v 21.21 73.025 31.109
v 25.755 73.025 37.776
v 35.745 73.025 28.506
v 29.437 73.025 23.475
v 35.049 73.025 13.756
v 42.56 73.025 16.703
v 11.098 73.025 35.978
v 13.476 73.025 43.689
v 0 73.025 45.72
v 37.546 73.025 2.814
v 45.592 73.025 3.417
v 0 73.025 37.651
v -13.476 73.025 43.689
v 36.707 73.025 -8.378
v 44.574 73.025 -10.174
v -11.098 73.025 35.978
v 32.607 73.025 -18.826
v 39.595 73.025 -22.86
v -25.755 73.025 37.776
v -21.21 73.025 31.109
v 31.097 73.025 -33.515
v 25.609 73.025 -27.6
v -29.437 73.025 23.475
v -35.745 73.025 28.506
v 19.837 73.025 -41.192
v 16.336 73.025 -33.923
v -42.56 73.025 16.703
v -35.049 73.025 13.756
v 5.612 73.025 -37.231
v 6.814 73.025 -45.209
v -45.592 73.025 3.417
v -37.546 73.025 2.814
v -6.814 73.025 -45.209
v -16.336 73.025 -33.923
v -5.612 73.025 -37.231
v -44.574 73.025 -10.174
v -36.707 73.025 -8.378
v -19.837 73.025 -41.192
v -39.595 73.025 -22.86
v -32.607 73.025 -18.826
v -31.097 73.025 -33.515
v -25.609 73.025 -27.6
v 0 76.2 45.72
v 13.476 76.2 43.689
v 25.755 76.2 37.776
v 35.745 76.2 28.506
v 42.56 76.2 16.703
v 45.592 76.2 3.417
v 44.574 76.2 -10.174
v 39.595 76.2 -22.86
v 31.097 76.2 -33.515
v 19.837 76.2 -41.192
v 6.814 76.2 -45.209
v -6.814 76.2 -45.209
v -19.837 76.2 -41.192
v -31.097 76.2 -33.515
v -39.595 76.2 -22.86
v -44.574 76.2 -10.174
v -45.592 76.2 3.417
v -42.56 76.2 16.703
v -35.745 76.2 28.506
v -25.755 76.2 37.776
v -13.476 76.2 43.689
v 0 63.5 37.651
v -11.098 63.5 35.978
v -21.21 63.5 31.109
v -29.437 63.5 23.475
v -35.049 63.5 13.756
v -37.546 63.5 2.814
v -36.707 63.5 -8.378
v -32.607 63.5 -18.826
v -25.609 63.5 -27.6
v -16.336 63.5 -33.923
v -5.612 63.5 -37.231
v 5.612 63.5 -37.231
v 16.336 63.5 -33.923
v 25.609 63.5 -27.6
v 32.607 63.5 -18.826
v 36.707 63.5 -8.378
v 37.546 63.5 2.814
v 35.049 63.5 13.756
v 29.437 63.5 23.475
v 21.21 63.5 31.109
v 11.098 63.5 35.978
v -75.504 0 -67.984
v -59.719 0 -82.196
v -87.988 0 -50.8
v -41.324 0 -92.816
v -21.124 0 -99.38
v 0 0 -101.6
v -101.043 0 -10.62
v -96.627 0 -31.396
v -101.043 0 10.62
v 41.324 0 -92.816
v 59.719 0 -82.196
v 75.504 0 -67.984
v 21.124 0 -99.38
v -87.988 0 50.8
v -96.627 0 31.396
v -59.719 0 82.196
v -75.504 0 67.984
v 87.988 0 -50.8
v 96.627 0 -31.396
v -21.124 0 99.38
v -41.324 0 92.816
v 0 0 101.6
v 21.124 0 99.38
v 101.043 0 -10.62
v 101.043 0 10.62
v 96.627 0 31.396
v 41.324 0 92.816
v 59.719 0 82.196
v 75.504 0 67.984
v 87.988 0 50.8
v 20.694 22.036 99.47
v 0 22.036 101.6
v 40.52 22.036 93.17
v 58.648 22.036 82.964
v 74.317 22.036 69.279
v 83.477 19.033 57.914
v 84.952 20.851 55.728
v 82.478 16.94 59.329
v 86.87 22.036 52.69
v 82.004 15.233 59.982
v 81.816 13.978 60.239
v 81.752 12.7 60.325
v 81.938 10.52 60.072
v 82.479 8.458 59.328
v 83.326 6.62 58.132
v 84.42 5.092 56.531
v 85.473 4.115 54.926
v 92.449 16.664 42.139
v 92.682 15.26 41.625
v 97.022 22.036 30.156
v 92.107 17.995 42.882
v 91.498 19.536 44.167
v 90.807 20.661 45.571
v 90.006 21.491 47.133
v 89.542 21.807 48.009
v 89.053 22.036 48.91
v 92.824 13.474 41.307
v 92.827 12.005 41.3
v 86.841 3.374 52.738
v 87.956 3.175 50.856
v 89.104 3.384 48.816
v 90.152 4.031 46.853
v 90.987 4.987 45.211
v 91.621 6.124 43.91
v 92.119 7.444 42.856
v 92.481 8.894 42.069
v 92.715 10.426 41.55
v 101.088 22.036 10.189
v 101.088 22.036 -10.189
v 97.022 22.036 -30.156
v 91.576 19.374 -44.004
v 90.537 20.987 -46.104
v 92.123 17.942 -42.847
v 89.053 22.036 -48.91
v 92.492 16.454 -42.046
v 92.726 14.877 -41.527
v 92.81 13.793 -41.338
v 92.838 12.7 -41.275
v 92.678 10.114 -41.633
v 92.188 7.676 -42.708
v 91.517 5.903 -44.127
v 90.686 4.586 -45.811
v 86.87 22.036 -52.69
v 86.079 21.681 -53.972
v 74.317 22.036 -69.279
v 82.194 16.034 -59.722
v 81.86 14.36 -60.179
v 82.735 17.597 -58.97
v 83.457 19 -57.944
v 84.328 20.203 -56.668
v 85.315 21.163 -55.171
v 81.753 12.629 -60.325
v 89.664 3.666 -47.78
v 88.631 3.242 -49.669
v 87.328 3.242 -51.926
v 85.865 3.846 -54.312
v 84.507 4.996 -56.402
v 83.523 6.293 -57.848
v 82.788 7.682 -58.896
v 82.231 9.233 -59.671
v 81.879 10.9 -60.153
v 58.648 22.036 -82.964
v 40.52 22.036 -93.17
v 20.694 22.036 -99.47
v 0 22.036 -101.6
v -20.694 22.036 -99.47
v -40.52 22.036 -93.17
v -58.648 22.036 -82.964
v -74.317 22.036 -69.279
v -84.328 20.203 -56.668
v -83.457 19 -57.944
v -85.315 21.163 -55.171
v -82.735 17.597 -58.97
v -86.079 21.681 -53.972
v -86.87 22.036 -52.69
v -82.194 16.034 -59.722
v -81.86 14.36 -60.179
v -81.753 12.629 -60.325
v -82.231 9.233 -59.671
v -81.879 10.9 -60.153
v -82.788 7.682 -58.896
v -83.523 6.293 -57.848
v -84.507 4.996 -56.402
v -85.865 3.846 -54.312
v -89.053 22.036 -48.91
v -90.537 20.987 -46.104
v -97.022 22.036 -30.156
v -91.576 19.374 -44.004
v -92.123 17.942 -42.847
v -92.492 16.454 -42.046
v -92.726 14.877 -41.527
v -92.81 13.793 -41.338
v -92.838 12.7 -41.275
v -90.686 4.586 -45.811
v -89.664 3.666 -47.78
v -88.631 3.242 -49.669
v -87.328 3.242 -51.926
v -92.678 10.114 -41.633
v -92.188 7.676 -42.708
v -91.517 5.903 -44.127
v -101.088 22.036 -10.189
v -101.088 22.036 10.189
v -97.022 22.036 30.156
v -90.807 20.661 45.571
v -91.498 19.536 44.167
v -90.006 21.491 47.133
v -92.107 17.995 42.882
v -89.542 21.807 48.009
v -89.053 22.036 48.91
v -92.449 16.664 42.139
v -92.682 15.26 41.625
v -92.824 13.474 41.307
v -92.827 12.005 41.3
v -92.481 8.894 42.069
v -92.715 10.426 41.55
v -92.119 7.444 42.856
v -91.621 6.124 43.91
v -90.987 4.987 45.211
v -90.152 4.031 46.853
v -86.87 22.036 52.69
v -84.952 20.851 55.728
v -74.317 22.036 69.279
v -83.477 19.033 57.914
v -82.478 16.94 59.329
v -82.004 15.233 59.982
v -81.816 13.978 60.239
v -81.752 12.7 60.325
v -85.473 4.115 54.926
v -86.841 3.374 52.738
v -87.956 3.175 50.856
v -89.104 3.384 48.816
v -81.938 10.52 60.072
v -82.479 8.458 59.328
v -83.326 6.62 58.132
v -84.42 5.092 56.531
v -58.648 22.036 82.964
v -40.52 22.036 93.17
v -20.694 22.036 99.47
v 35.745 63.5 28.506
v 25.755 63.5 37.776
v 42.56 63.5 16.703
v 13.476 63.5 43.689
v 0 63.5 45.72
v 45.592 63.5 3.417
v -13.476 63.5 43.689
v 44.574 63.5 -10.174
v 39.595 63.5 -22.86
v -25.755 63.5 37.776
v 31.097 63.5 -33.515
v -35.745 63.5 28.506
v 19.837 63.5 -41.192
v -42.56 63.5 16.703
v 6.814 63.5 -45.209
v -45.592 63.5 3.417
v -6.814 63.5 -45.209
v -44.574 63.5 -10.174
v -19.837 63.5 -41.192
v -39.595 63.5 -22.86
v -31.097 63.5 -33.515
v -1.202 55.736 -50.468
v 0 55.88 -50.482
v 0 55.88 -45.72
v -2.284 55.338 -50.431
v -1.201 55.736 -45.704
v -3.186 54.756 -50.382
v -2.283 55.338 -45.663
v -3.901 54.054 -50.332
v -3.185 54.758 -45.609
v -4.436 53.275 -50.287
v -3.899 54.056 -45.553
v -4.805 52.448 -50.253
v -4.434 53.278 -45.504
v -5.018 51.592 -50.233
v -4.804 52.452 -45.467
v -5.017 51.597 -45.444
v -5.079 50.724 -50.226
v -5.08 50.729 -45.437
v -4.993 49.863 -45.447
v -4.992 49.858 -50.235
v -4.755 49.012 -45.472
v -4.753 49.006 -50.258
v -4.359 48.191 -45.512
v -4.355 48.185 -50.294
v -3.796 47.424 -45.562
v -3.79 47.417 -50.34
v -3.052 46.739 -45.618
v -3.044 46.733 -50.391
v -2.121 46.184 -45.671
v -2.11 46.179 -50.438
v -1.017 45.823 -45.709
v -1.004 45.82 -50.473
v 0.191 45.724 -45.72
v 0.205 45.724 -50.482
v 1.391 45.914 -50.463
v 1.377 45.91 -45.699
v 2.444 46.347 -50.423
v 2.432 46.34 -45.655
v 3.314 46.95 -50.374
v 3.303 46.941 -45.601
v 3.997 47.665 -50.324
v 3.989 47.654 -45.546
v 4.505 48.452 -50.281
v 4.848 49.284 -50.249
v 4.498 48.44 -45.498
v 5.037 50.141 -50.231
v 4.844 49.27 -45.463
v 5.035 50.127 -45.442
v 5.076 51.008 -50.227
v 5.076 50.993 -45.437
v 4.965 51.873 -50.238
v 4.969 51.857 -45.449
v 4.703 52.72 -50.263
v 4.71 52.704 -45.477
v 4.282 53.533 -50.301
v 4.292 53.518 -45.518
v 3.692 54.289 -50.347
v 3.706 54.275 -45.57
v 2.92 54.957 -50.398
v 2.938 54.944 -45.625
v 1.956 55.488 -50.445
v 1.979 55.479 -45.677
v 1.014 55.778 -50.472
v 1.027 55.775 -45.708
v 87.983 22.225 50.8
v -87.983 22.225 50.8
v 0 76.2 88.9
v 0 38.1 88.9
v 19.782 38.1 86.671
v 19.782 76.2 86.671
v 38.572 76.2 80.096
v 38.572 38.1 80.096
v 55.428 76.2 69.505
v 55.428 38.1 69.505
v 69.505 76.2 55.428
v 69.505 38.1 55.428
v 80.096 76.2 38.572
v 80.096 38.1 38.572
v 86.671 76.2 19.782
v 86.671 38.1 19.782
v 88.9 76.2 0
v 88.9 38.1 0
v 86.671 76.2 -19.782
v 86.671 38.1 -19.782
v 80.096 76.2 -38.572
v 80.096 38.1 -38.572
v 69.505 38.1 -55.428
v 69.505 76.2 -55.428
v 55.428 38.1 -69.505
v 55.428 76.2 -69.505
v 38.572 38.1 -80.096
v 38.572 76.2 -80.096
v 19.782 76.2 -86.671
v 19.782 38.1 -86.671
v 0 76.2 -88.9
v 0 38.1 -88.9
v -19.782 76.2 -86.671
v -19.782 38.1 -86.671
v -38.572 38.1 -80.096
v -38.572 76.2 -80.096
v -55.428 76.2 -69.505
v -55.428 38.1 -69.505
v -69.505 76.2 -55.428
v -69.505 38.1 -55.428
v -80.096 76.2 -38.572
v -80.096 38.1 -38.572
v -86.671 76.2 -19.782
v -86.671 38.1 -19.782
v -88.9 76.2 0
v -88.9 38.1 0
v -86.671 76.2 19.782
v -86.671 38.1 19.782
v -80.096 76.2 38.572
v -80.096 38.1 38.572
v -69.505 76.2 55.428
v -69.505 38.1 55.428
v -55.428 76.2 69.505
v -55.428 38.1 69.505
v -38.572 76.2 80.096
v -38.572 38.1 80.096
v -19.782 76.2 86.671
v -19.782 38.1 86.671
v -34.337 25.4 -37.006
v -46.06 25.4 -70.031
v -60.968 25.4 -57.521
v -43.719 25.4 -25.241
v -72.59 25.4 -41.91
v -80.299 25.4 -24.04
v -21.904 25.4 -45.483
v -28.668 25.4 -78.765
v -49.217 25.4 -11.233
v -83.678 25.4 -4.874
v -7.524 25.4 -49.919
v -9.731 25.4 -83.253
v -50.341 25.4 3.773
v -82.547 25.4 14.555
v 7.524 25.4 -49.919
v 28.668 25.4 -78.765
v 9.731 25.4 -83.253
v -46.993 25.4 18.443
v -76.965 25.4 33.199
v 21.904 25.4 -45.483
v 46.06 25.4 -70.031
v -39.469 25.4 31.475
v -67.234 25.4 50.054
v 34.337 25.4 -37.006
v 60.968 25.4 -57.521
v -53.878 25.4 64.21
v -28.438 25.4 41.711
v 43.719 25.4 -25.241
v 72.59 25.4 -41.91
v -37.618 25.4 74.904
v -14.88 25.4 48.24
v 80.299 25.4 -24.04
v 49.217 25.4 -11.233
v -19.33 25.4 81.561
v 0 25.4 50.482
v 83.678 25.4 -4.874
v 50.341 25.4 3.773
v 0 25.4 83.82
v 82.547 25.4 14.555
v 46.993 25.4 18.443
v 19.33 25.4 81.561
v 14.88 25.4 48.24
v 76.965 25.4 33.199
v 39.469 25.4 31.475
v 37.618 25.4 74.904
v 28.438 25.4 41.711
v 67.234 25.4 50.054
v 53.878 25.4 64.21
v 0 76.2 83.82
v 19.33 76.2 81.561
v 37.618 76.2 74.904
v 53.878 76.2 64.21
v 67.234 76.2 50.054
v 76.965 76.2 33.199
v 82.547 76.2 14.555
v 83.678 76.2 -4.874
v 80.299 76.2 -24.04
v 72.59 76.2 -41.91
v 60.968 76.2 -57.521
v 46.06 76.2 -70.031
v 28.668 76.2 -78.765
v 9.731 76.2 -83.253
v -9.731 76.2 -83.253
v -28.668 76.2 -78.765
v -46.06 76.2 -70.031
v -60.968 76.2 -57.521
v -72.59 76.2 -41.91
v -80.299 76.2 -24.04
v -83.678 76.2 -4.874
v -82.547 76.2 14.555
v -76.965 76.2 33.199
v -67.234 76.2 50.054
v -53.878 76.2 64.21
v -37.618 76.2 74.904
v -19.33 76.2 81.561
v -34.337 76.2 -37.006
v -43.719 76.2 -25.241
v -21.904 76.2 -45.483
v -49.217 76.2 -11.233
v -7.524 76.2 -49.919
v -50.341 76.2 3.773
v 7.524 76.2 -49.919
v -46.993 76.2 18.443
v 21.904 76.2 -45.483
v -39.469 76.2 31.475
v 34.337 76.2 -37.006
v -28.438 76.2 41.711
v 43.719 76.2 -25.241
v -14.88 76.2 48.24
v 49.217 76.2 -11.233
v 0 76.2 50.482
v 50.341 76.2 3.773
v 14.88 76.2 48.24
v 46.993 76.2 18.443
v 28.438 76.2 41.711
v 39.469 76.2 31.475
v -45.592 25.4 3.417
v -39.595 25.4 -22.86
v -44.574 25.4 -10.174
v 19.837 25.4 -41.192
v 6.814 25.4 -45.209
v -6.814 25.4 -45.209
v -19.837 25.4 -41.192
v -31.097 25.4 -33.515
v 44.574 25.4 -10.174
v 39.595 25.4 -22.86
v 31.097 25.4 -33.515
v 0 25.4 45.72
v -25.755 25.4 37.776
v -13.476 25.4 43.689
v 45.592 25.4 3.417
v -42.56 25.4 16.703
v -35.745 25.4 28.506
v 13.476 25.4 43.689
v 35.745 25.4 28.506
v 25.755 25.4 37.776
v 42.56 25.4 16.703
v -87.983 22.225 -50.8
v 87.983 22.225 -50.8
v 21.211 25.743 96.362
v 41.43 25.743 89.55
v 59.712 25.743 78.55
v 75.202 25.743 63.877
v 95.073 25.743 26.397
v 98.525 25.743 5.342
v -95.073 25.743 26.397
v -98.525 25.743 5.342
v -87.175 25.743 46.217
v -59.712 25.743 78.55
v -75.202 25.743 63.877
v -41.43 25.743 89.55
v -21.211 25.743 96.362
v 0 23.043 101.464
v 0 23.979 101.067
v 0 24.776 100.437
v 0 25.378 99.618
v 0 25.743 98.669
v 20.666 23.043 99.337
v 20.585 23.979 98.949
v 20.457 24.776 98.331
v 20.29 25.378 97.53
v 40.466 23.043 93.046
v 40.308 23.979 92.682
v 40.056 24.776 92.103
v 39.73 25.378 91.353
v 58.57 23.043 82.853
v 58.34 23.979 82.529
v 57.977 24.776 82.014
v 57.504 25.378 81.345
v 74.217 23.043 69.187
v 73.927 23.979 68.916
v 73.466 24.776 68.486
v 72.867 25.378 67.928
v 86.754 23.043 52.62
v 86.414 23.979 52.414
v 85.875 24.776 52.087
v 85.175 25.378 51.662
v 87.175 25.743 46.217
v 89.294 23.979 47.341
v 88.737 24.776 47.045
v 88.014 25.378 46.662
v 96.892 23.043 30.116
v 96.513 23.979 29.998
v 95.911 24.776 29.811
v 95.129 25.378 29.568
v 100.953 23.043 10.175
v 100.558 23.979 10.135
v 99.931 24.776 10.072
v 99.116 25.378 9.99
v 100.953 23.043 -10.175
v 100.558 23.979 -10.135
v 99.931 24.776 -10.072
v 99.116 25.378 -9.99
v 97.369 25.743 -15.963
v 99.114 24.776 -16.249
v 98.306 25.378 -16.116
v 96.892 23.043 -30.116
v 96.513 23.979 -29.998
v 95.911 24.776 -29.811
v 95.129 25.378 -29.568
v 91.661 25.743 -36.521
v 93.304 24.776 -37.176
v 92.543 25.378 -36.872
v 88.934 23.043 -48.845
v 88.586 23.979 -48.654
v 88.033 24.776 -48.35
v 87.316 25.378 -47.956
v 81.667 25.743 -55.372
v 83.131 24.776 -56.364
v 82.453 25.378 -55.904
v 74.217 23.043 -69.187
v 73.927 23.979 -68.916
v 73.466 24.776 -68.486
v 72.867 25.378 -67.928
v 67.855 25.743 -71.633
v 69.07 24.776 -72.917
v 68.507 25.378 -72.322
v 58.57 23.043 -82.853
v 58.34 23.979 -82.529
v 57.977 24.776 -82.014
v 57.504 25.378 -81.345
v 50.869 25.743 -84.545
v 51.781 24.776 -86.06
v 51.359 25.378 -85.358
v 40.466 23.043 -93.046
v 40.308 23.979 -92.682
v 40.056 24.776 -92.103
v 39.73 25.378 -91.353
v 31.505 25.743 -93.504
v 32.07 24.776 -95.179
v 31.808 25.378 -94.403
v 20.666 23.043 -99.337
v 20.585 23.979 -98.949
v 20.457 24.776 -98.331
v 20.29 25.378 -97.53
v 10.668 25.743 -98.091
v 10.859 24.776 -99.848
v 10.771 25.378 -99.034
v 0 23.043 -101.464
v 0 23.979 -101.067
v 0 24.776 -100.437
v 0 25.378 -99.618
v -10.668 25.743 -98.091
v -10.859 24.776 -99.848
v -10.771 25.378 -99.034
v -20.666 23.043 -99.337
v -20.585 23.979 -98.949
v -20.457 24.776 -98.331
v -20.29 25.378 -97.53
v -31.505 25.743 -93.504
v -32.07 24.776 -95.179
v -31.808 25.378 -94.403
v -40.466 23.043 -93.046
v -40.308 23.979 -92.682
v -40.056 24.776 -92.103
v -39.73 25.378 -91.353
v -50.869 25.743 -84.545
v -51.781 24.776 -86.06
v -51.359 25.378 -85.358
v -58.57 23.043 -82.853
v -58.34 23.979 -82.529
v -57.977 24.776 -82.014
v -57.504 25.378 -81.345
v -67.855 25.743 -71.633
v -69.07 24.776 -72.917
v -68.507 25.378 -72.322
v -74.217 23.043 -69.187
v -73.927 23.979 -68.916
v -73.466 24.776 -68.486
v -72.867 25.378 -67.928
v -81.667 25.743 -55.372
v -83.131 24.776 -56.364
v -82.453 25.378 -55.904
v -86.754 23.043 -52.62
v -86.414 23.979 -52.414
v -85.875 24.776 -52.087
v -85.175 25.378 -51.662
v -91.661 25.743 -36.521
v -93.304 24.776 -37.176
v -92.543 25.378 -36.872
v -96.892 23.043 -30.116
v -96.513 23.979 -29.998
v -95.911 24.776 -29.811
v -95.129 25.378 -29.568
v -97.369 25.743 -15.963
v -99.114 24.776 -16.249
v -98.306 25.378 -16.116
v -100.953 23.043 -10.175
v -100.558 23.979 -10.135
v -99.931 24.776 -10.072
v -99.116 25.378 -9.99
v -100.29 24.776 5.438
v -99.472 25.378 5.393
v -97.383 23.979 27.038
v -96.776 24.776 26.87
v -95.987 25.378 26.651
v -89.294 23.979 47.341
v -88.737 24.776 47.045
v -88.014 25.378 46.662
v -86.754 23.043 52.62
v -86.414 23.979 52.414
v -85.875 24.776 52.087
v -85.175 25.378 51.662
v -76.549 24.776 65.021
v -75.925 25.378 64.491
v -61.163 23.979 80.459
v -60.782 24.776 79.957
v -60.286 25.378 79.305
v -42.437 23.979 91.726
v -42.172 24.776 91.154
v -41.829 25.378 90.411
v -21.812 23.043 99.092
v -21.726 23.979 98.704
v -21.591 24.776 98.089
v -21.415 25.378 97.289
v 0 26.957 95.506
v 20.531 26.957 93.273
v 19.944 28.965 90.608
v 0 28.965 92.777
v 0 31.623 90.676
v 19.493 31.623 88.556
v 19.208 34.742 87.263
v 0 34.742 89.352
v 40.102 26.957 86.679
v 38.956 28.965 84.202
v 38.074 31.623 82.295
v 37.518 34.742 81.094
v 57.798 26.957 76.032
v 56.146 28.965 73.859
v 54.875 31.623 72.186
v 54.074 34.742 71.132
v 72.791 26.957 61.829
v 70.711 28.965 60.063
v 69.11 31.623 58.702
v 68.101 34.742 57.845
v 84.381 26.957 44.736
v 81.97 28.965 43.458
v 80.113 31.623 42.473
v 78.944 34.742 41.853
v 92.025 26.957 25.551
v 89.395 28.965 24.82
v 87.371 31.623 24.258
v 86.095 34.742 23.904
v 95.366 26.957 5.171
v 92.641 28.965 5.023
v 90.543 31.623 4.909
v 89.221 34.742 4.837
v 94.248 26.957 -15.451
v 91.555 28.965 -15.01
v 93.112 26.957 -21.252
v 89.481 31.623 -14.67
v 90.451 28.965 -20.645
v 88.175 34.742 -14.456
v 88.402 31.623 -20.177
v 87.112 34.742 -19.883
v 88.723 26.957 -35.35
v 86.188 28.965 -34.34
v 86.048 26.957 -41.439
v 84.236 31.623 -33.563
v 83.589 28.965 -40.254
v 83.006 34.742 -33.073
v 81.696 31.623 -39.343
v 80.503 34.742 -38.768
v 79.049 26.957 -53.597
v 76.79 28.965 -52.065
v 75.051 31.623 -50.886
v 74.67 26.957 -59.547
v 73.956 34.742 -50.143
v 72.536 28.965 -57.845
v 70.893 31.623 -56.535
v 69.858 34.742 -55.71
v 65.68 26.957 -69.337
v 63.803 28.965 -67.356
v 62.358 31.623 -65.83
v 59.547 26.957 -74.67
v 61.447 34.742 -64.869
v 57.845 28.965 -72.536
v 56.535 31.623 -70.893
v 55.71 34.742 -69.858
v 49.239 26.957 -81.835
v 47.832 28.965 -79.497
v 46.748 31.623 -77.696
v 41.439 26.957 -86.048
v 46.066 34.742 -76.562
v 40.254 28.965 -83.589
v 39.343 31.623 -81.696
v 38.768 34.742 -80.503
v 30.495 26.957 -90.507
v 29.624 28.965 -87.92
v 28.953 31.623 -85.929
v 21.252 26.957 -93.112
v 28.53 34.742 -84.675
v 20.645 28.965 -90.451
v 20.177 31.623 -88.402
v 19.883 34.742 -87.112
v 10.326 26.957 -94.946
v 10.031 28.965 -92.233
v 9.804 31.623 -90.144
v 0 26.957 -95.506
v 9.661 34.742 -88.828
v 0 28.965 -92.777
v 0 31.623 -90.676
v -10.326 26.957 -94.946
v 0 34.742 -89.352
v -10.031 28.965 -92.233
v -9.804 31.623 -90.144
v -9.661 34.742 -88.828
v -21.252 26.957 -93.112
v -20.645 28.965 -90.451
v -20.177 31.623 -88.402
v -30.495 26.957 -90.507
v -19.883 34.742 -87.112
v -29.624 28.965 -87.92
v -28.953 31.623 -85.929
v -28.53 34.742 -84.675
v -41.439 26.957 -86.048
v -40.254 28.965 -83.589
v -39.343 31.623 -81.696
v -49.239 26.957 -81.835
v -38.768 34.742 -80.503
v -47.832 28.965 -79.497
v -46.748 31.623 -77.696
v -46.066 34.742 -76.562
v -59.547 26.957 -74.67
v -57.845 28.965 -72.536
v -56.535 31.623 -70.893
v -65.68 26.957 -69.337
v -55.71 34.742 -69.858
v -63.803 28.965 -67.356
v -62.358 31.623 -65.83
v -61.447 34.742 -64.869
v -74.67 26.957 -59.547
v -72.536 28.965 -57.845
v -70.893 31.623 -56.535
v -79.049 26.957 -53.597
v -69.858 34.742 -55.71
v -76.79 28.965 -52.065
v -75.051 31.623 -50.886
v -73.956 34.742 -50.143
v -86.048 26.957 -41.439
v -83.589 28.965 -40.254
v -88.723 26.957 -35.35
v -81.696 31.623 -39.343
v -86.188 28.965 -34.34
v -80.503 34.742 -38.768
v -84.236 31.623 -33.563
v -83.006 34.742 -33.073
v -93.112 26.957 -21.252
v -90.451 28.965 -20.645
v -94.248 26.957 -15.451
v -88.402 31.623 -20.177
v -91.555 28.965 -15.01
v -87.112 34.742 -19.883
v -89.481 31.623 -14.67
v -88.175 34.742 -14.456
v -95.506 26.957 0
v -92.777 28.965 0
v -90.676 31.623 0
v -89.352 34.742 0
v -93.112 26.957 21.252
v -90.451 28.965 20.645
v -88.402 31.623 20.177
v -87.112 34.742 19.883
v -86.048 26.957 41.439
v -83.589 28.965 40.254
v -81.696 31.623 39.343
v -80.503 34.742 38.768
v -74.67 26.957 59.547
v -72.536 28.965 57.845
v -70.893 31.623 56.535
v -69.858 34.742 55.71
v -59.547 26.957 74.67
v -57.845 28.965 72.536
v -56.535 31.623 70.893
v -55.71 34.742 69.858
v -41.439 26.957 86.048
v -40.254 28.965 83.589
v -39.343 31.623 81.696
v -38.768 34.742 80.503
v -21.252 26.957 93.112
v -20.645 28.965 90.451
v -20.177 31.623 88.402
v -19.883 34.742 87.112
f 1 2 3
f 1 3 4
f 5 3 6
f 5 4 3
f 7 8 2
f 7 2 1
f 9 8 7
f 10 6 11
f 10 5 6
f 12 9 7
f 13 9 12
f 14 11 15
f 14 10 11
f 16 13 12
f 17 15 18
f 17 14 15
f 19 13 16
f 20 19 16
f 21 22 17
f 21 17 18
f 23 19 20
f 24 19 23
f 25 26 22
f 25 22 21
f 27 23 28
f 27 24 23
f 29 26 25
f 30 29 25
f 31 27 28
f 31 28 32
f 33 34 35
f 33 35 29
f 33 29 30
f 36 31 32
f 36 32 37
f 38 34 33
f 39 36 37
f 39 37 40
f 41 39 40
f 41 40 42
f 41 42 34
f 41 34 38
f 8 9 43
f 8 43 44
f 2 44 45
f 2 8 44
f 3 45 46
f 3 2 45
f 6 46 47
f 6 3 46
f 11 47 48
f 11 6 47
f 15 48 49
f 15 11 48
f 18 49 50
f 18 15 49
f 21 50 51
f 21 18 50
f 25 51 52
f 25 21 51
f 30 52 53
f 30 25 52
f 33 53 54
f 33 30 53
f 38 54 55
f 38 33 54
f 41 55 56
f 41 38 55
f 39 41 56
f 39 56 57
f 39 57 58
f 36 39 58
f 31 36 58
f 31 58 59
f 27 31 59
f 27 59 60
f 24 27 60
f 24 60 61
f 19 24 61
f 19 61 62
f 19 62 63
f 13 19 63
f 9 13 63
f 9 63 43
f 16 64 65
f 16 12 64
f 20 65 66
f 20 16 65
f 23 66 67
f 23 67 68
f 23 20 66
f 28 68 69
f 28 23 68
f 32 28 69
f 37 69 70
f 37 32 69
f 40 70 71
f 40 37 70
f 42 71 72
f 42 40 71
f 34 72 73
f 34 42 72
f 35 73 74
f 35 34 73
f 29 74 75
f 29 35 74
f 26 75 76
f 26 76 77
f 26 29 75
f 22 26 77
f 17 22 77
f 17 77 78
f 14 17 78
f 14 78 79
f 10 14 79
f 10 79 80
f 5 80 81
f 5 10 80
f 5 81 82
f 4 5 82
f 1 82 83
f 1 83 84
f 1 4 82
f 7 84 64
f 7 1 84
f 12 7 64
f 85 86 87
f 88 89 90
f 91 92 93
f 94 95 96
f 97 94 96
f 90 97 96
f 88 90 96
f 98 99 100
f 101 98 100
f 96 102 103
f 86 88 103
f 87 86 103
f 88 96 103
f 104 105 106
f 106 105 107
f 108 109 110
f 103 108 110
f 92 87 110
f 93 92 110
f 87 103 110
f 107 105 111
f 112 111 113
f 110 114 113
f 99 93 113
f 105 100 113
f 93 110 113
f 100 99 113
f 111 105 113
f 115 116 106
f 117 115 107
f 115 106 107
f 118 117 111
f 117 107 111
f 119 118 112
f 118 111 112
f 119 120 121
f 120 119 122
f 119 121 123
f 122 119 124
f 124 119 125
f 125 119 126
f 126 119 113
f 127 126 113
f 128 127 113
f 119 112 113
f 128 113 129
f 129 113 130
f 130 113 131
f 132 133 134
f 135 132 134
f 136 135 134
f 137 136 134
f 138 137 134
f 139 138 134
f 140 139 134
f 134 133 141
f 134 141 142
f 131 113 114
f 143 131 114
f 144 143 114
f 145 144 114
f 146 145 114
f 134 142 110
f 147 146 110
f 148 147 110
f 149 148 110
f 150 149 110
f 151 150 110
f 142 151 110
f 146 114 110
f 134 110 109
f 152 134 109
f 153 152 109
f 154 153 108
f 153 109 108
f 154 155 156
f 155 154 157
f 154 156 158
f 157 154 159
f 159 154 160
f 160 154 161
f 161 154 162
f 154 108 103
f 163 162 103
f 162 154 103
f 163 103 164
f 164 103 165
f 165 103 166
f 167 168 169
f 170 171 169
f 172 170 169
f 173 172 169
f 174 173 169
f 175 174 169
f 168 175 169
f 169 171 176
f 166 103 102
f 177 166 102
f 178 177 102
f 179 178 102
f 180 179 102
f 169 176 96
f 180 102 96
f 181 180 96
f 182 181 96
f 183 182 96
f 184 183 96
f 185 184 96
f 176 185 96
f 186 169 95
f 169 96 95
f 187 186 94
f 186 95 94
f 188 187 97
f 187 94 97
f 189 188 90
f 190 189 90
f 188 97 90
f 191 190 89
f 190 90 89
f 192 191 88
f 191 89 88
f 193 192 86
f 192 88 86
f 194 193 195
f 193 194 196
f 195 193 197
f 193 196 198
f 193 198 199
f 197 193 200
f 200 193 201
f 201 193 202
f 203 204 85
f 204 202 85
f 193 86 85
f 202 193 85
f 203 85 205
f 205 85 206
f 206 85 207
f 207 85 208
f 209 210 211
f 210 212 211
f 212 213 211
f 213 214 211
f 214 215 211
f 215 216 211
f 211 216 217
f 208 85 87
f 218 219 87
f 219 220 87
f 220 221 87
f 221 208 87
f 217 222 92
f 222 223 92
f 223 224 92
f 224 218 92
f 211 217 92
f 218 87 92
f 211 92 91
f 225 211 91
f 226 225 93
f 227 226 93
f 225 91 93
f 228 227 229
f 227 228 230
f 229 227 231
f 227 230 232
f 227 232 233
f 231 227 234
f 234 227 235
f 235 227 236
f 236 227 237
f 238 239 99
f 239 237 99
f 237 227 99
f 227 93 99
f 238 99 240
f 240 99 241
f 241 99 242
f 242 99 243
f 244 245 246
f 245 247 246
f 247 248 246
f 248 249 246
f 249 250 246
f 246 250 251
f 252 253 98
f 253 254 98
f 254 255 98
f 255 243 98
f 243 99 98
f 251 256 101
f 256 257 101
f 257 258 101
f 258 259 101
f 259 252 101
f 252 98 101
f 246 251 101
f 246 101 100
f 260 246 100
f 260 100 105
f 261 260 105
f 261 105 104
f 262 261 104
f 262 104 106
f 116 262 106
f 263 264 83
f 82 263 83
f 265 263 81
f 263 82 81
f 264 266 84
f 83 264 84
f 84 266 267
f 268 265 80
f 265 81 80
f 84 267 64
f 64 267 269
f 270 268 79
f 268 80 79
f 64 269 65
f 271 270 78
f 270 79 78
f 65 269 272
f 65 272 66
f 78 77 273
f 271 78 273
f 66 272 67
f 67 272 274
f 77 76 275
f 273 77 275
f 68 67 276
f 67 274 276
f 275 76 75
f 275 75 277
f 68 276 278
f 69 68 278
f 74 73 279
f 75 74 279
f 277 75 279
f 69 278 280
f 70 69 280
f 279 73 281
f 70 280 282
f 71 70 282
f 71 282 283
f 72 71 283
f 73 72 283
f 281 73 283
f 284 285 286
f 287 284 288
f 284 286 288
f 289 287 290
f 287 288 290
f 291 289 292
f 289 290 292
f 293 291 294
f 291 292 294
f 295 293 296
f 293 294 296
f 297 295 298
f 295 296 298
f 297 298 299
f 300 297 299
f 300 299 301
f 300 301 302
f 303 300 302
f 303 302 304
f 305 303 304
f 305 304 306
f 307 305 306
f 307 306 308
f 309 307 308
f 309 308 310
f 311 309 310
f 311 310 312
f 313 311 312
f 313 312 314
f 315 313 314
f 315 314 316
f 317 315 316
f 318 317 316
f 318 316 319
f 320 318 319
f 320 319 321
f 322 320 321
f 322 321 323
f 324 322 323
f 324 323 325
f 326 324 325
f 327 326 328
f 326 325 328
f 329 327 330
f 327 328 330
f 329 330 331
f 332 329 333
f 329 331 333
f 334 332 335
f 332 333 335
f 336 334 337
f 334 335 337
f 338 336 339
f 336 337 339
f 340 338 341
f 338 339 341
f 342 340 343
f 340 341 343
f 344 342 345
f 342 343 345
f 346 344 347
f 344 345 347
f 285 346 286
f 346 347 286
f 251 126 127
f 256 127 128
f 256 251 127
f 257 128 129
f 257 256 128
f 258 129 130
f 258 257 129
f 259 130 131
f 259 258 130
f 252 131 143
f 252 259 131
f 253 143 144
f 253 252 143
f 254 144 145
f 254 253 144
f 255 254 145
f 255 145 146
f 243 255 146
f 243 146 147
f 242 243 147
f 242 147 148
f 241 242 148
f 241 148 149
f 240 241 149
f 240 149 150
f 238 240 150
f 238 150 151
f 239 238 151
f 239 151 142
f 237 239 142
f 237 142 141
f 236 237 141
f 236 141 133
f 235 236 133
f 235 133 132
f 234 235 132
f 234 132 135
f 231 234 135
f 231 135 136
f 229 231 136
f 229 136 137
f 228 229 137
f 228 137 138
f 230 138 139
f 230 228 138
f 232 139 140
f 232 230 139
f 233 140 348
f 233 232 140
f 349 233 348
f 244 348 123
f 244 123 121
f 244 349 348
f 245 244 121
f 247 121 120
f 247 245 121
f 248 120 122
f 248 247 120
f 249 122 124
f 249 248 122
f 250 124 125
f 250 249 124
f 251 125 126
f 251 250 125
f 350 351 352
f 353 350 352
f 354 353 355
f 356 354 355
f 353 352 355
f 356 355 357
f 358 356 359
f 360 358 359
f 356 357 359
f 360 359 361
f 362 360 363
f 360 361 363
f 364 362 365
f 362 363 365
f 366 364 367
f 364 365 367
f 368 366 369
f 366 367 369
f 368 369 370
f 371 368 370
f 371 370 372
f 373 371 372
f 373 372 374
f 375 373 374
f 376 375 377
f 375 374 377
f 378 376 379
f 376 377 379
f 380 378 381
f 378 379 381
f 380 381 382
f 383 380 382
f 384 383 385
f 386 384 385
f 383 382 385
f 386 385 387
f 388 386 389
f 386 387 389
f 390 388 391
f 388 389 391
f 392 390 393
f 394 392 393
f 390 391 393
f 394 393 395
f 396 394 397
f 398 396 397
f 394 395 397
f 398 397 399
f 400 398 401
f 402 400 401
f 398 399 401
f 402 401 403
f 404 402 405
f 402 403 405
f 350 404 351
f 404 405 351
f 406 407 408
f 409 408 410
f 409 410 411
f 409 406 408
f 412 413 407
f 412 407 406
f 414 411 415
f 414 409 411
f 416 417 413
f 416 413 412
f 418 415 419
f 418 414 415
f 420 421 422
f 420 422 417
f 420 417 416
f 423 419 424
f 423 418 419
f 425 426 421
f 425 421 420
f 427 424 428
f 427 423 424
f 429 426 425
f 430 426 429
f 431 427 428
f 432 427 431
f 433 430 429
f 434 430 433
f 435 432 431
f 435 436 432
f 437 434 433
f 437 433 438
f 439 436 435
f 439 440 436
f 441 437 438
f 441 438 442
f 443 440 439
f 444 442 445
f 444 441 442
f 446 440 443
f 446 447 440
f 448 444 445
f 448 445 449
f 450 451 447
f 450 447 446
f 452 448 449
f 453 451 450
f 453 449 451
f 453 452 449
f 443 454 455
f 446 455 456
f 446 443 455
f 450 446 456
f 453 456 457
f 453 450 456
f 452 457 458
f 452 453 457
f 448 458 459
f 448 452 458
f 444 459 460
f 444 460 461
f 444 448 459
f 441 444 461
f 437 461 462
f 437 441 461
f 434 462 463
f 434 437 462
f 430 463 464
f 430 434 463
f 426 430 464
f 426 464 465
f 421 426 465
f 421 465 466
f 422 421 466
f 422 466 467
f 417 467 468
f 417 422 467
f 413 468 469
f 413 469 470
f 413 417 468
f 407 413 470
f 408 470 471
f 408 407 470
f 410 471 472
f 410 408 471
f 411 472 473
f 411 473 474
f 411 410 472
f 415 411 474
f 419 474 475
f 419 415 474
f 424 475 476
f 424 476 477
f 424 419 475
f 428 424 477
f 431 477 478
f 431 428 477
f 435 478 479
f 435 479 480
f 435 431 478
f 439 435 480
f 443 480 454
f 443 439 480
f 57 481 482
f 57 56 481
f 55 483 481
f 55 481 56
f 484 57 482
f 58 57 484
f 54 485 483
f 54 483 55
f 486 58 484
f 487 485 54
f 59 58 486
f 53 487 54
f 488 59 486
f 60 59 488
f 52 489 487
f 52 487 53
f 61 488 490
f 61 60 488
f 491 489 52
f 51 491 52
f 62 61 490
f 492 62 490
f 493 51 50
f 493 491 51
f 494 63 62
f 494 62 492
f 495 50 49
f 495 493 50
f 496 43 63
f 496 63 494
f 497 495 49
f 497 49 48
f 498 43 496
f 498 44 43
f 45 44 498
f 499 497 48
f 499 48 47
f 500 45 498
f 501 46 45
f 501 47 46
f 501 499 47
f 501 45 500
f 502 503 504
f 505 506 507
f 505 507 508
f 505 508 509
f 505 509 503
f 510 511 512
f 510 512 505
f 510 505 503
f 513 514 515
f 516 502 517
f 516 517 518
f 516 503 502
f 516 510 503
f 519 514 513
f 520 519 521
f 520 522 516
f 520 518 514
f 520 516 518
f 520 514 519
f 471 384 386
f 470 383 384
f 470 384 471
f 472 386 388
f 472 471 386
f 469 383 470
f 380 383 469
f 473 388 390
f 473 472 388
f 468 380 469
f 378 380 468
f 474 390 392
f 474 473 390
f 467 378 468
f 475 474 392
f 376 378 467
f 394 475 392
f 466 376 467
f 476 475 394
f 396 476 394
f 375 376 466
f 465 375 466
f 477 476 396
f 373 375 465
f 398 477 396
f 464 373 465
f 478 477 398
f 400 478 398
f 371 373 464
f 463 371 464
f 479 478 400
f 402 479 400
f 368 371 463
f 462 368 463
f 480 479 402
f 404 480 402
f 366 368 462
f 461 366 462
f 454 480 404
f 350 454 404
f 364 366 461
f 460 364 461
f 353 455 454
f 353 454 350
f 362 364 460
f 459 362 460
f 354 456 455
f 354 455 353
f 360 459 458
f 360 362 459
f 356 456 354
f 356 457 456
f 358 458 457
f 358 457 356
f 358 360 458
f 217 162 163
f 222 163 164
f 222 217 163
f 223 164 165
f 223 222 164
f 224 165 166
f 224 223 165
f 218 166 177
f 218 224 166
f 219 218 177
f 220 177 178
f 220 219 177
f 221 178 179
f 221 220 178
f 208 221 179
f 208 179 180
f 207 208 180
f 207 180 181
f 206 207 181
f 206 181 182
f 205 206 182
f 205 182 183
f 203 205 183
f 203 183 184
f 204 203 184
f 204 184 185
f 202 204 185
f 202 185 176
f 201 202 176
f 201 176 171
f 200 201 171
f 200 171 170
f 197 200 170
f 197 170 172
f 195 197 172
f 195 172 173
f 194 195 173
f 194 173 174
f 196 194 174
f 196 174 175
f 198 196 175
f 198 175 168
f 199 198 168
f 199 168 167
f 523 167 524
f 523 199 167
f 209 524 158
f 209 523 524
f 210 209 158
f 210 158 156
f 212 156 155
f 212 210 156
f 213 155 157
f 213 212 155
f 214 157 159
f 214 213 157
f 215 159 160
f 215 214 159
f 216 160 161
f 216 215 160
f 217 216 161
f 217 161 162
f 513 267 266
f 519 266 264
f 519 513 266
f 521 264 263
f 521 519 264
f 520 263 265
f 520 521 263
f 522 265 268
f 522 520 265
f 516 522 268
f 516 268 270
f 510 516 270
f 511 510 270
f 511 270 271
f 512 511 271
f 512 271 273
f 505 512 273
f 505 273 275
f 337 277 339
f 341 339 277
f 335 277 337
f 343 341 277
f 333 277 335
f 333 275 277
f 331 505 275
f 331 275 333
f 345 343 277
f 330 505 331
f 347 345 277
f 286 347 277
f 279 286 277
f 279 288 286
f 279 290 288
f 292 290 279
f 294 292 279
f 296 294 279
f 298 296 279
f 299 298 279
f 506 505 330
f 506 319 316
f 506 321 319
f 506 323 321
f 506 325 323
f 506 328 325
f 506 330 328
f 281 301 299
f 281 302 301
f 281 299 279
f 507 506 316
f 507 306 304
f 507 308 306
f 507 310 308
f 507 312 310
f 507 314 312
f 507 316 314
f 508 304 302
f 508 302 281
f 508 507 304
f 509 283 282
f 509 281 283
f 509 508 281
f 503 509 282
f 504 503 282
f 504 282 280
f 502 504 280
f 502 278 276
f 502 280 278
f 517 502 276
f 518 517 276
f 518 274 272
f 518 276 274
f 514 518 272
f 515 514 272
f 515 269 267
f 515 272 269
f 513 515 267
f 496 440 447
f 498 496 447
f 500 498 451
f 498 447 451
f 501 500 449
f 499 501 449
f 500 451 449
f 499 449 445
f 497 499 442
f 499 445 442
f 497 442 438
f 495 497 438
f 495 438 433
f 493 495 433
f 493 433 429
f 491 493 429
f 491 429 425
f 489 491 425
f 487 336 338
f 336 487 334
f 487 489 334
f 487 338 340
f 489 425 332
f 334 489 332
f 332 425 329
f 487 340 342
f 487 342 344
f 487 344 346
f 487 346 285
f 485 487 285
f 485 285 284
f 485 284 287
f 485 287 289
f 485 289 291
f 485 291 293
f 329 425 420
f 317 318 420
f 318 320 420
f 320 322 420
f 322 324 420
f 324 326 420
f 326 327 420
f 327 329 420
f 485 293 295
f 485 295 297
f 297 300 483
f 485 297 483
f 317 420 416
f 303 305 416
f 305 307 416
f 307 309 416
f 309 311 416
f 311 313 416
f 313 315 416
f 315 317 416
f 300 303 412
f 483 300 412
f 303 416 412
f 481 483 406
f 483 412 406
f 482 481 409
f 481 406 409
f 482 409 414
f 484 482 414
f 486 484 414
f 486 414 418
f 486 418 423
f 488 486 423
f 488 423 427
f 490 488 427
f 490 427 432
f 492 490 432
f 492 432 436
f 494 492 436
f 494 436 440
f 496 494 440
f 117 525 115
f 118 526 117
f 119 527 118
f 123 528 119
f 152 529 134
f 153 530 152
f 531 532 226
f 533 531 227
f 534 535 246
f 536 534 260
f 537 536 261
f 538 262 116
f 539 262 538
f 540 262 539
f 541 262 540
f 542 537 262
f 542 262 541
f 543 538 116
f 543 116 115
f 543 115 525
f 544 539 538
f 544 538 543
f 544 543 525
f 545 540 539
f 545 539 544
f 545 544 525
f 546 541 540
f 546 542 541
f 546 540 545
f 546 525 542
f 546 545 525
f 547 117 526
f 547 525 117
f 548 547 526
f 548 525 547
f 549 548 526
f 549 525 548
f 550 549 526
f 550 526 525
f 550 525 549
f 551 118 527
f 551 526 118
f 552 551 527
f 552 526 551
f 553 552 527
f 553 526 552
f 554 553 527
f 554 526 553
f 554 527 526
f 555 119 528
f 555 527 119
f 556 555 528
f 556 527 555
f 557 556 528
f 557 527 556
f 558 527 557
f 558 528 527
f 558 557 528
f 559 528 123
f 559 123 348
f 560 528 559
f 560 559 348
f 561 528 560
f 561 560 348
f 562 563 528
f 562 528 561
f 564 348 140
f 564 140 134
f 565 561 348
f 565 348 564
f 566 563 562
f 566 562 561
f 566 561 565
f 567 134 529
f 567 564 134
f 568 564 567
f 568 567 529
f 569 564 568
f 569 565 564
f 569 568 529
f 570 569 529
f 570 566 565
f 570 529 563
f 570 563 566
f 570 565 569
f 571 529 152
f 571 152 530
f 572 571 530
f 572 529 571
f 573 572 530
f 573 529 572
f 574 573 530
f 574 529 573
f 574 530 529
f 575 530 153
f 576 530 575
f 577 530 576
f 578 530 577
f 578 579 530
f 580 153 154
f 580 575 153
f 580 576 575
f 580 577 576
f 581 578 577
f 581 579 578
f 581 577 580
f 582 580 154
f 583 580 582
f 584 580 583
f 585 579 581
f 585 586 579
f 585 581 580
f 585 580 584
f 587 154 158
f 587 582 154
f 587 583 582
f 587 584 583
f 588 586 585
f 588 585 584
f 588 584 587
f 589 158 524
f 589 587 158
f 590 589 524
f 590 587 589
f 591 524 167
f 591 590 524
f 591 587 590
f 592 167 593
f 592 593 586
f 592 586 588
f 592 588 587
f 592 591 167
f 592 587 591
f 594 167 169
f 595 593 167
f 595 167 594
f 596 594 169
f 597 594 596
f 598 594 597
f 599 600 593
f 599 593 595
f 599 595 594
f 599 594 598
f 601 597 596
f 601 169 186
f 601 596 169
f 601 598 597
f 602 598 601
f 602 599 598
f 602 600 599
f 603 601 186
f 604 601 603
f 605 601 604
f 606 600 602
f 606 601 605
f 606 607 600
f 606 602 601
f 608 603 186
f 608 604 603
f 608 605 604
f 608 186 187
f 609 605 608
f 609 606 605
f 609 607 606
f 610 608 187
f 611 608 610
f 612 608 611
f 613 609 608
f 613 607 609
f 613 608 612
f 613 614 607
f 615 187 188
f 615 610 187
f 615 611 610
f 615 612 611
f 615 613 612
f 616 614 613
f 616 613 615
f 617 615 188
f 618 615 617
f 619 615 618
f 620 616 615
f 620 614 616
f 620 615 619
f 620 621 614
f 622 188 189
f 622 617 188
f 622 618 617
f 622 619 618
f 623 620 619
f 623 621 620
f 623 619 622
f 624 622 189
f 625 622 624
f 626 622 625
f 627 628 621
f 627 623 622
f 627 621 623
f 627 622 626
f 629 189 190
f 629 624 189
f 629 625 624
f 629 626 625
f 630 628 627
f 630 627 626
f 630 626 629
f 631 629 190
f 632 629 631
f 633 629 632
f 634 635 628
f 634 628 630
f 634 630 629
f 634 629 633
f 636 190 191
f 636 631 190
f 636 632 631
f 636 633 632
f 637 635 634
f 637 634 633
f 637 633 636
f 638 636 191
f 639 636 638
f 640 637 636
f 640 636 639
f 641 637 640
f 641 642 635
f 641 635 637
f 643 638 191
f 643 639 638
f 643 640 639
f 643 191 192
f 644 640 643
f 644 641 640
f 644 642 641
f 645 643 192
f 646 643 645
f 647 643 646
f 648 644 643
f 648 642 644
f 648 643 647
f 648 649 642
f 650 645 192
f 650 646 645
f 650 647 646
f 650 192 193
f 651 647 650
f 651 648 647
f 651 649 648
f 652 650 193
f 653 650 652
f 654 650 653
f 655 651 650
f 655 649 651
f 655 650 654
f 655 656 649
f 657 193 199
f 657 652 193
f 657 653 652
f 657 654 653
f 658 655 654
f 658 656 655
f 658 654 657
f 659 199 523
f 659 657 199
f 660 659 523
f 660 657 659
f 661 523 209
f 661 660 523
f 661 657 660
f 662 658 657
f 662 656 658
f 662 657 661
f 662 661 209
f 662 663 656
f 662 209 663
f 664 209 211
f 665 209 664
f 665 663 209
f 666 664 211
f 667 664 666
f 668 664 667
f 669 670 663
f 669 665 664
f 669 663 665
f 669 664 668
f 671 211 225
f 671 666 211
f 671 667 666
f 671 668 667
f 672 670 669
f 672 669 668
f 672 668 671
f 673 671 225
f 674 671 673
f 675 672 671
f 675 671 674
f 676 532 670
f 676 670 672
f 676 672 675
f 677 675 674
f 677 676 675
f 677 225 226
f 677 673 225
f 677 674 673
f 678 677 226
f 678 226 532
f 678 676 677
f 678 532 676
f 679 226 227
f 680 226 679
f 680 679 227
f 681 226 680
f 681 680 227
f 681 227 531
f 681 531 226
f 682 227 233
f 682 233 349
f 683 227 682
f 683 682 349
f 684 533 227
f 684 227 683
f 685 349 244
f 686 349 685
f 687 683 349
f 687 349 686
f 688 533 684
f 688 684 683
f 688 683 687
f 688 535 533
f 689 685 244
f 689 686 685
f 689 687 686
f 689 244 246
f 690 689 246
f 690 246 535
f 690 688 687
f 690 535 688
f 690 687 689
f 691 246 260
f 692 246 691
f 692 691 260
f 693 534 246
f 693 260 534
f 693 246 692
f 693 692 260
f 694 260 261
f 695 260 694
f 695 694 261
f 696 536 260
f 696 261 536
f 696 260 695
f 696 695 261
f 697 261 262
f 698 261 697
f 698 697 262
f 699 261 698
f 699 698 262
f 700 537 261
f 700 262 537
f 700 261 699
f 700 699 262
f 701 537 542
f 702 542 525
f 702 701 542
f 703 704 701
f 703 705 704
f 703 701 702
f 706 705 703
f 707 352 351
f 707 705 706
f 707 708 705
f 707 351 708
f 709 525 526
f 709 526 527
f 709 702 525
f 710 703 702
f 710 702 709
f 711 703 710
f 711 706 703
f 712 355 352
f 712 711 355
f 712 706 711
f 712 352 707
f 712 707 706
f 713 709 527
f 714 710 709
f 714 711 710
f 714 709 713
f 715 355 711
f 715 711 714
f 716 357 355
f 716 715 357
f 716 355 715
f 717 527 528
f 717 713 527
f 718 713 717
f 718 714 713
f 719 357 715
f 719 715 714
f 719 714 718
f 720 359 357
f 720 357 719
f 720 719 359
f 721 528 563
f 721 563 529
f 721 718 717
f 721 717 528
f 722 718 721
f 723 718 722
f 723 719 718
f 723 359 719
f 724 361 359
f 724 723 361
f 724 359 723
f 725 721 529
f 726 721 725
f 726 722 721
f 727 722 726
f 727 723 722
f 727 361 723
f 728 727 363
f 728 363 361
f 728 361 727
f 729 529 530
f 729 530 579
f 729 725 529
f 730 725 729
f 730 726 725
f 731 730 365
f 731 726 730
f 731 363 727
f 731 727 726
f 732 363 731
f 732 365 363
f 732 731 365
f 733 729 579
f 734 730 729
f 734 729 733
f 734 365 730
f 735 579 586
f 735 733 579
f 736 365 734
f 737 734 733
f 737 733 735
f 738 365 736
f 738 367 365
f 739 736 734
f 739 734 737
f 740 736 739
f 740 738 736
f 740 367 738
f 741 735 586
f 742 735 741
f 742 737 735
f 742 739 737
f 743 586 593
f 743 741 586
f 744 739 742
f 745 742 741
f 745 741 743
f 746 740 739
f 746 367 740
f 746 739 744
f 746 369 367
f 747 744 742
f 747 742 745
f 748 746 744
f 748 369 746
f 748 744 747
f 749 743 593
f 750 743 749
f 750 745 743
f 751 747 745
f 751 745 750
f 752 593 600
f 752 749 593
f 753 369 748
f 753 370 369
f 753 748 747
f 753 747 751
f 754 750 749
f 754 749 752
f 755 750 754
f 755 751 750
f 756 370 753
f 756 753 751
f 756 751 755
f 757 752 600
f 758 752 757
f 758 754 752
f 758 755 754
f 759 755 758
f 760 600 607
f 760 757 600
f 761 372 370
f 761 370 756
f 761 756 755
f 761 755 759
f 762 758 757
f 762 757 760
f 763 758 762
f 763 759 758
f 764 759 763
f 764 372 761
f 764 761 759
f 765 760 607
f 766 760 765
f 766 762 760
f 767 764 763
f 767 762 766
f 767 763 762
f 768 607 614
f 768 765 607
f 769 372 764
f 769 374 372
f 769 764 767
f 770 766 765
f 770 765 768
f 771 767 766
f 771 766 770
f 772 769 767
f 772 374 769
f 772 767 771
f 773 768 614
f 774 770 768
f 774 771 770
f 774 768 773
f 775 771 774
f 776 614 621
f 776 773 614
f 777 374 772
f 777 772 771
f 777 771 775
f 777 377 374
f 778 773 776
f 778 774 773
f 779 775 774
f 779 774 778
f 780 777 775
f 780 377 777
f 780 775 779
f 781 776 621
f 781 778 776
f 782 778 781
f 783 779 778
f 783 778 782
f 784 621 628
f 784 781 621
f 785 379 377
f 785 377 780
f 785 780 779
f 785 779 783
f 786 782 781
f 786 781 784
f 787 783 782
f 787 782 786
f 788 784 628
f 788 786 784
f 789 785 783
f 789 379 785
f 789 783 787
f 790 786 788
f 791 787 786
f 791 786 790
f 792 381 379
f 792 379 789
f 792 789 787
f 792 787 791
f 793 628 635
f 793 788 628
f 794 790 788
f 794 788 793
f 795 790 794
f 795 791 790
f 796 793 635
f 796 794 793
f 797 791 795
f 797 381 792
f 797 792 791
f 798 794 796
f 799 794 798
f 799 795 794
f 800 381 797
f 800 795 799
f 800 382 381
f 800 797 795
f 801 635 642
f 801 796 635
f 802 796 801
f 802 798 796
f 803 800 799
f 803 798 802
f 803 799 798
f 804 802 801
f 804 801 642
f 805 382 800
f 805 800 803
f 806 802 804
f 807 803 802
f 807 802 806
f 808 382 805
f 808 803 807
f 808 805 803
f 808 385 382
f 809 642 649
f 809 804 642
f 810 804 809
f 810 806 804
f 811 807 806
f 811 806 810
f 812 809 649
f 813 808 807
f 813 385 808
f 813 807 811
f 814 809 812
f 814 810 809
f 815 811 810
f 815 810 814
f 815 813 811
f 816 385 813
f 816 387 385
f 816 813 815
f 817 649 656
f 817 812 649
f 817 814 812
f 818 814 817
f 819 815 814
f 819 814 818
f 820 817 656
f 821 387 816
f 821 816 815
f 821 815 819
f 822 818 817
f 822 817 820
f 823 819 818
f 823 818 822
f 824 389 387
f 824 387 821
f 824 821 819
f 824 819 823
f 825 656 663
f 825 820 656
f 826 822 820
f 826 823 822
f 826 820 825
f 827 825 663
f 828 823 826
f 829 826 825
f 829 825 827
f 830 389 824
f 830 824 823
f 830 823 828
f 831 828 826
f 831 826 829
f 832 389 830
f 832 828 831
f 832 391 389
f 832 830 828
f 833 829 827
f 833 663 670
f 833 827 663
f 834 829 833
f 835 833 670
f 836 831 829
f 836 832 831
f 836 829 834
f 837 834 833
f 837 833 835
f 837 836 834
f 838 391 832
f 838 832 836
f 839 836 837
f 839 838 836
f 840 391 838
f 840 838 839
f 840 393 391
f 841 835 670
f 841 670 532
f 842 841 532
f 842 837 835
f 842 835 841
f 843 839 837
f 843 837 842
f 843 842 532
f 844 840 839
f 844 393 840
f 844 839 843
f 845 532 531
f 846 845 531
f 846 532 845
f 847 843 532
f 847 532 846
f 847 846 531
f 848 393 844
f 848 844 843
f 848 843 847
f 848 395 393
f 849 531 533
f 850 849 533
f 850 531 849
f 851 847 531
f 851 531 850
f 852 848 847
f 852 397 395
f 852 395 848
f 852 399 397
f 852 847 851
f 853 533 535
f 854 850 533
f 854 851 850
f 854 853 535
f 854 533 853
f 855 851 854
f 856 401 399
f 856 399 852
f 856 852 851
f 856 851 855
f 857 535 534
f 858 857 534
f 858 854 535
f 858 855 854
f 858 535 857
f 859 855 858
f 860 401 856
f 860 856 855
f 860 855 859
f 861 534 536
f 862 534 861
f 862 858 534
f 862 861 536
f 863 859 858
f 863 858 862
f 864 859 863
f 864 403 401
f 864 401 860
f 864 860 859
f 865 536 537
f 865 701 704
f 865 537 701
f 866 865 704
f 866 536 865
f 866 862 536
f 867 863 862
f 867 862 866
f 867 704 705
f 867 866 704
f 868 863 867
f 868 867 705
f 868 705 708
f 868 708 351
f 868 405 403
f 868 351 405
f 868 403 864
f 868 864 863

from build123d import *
from build123d.topology import SkipClean

# Parameters (mm, degrees)
SKETCH1_R               = 101.6
BOSS_EXTRUDE1_DEPTH     = 25.4
SKETCH4_R               = 88.9
SKETCH4_R_2             = 83.82
BOSS_EXTRUDE2_DEPTH     = 50.8
CUT_EXTRUDE4_DEPTH      = 101.6
CUT_EXTRUDE4_DEPTH_BACK = 101.6
SKETCH2_R               = 9.525
FILLET7_R               = 12.7
FILLET8_R               = 3.81
SKETCH11_R              = 50.4825
SKETCH11_R_2            = 45.72
BOSS_EXTRUDE5_DEPTH     = 50.8
SKETCH13_W              = 8.068772826
SKETCH13_H              = 9.525
SKETCH14_R              = 5.08
CUT_EXTRUDE5_DEPTH      = 50.8


# Some blends are built 0.0001 mm under size
with BuildPart() as part:
    # Sketch1 → Boss-Extrude1 (new body)
    with BuildSketch(Plane(origin=(0, 0, 0), x_dir=(1, 0, 0), z_dir=(0, 1, 0))):
        with Locations(Location((0, 0, 0), (0, 0, 270))):
            Circle(SKETCH1_R)
    extrude(amount=BOSS_EXTRUDE1_DEPTH)

    # Sketch4 → Boss-Extrude2 (add)
    with BuildSketch(Plane(origin=(0, 25.4, 0), x_dir=(1, 0, 0), z_dir=(0, 1, 0))):
        with Locations(Location((0, 0, 0), (0, 0, 270))):
            Circle(SKETCH4_R)
        with Locations(Location((0, 0, 0), (0, 0, 270))):
            Circle(SKETCH4_R_2, mode=Mode.SUBTRACT)
    extrude(amount=BOSS_EXTRUDE2_DEPTH)

    # Sketch2 → Cut-Extrude4 (cut, two sides: drawn at the far end of the back side and taken through both)
    with BuildSketch(Plane(origin=(0, 0, 0), x_dir=(0, 0, -1), z_dir=(1, 0, 0)).offset(-CUT_EXTRUDE4_DEPTH_BACK)):
        with Locations(Location((50.8, 12.7, 0), (0, 0, 180))):
            Circle(SKETCH2_R)
        with Locations(Location((-50.8, 12.7, 0), (0, 0, 180))):
            Circle(SKETCH2_R)
    extrude(amount=CUT_EXTRUDE4_DEPTH + CUT_EXTRUDE4_DEPTH_BACK, mode=Mode.SUBTRACT)

    # Fillet7
    fillet7_edges = [part.edges().sort_by_distance(p)[0] for p in [
        (0, 25.4, -88.9),
    ]]
    fillet(fillet7_edges, radius=FILLET7_R - 0.0001)  # a hair under: the kernel refuses the full size

    # Fillet8
    # the kernel refuses this fillet: 3.81 mm, written as the material it takes off along each edge
    with BuildSketch(Plane(origin=(0, 25.4, 0), x_dir=(0, 0, 1), z_dir=(-1, 0, 0))) as fillet8_piece_1:
        with BuildLine():
            CenterArc((97.79, -3.364391457), FILLET8_R, 360, 76.657910561)
            Line((101.6, -3.364391457), (101.981, -3.364391457))
            Line((101.981, -3.364391457), (101.981, 0))
            Line((101.981, 0), (101.6, 0.381))
            ThreePointArc((101.6, 0.381), (101.5999, 0.381), (98.757134319, 0.713491843))
            Line((98.757134319, 0.713491843), (98.669213018, 0.34277518))
        make_face()
    revolve(axis=Axis((0, 25.4, 0), (0, 1, 0)), mode=Mode.SUBTRACT)

    # Sketch11 → Boss-Extrude5 (add)
    with SkipClean():  # the faces are left unmerged after this step: merging them gives an invalid solid
        with BuildSketch(Plane(origin=(0, 25.4, 0), x_dir=(1, 0, 0), z_dir=(0, 1, 0))):
            with Locations(Location((0, 0, 0), (0, 0, 270))):
                Circle(SKETCH11_R)
            with Locations(Location((0, 0, 0), (0, 0, 270))):
                Circle(SKETCH11_R_2, mode=Mode.SUBTRACT)
        extrude(amount=BOSS_EXTRUDE5_DEPTH)

    # Sketch13 → Revolve1 (revolve)
    with SkipClean():  # the faces are left unmerged after this step: merging them gives an invalid solid
        with BuildSketch(Plane.XY, mode=Mode.PRIVATE) as revolve1_sk:
            with Locations((41.685613587, 68.2625)):
                Rectangle(SKETCH13_W, SKETCH13_H)
        revolve(revolve1_sk.sketch.rotate(Axis((0, 80.01, 0), (0, -1, 0)), 90), axis=Axis((0, 80.01, 0), (0, -1, 0)))

    # Sketch14 → Cut-Extrude5 (cut)
    with SkipClean():  # the faces are left unmerged after this step: merging them gives an invalid solid
        with BuildSketch(Plane.XY):
            with Locations(Location((0, 50.8, 0), (0, 0, 90))):
                Circle(SKETCH14_R)
        extrude(amount=-CUT_EXTRUDE5_DEPTH, mode=Mode.SUBTRACT)


solid = part.part
